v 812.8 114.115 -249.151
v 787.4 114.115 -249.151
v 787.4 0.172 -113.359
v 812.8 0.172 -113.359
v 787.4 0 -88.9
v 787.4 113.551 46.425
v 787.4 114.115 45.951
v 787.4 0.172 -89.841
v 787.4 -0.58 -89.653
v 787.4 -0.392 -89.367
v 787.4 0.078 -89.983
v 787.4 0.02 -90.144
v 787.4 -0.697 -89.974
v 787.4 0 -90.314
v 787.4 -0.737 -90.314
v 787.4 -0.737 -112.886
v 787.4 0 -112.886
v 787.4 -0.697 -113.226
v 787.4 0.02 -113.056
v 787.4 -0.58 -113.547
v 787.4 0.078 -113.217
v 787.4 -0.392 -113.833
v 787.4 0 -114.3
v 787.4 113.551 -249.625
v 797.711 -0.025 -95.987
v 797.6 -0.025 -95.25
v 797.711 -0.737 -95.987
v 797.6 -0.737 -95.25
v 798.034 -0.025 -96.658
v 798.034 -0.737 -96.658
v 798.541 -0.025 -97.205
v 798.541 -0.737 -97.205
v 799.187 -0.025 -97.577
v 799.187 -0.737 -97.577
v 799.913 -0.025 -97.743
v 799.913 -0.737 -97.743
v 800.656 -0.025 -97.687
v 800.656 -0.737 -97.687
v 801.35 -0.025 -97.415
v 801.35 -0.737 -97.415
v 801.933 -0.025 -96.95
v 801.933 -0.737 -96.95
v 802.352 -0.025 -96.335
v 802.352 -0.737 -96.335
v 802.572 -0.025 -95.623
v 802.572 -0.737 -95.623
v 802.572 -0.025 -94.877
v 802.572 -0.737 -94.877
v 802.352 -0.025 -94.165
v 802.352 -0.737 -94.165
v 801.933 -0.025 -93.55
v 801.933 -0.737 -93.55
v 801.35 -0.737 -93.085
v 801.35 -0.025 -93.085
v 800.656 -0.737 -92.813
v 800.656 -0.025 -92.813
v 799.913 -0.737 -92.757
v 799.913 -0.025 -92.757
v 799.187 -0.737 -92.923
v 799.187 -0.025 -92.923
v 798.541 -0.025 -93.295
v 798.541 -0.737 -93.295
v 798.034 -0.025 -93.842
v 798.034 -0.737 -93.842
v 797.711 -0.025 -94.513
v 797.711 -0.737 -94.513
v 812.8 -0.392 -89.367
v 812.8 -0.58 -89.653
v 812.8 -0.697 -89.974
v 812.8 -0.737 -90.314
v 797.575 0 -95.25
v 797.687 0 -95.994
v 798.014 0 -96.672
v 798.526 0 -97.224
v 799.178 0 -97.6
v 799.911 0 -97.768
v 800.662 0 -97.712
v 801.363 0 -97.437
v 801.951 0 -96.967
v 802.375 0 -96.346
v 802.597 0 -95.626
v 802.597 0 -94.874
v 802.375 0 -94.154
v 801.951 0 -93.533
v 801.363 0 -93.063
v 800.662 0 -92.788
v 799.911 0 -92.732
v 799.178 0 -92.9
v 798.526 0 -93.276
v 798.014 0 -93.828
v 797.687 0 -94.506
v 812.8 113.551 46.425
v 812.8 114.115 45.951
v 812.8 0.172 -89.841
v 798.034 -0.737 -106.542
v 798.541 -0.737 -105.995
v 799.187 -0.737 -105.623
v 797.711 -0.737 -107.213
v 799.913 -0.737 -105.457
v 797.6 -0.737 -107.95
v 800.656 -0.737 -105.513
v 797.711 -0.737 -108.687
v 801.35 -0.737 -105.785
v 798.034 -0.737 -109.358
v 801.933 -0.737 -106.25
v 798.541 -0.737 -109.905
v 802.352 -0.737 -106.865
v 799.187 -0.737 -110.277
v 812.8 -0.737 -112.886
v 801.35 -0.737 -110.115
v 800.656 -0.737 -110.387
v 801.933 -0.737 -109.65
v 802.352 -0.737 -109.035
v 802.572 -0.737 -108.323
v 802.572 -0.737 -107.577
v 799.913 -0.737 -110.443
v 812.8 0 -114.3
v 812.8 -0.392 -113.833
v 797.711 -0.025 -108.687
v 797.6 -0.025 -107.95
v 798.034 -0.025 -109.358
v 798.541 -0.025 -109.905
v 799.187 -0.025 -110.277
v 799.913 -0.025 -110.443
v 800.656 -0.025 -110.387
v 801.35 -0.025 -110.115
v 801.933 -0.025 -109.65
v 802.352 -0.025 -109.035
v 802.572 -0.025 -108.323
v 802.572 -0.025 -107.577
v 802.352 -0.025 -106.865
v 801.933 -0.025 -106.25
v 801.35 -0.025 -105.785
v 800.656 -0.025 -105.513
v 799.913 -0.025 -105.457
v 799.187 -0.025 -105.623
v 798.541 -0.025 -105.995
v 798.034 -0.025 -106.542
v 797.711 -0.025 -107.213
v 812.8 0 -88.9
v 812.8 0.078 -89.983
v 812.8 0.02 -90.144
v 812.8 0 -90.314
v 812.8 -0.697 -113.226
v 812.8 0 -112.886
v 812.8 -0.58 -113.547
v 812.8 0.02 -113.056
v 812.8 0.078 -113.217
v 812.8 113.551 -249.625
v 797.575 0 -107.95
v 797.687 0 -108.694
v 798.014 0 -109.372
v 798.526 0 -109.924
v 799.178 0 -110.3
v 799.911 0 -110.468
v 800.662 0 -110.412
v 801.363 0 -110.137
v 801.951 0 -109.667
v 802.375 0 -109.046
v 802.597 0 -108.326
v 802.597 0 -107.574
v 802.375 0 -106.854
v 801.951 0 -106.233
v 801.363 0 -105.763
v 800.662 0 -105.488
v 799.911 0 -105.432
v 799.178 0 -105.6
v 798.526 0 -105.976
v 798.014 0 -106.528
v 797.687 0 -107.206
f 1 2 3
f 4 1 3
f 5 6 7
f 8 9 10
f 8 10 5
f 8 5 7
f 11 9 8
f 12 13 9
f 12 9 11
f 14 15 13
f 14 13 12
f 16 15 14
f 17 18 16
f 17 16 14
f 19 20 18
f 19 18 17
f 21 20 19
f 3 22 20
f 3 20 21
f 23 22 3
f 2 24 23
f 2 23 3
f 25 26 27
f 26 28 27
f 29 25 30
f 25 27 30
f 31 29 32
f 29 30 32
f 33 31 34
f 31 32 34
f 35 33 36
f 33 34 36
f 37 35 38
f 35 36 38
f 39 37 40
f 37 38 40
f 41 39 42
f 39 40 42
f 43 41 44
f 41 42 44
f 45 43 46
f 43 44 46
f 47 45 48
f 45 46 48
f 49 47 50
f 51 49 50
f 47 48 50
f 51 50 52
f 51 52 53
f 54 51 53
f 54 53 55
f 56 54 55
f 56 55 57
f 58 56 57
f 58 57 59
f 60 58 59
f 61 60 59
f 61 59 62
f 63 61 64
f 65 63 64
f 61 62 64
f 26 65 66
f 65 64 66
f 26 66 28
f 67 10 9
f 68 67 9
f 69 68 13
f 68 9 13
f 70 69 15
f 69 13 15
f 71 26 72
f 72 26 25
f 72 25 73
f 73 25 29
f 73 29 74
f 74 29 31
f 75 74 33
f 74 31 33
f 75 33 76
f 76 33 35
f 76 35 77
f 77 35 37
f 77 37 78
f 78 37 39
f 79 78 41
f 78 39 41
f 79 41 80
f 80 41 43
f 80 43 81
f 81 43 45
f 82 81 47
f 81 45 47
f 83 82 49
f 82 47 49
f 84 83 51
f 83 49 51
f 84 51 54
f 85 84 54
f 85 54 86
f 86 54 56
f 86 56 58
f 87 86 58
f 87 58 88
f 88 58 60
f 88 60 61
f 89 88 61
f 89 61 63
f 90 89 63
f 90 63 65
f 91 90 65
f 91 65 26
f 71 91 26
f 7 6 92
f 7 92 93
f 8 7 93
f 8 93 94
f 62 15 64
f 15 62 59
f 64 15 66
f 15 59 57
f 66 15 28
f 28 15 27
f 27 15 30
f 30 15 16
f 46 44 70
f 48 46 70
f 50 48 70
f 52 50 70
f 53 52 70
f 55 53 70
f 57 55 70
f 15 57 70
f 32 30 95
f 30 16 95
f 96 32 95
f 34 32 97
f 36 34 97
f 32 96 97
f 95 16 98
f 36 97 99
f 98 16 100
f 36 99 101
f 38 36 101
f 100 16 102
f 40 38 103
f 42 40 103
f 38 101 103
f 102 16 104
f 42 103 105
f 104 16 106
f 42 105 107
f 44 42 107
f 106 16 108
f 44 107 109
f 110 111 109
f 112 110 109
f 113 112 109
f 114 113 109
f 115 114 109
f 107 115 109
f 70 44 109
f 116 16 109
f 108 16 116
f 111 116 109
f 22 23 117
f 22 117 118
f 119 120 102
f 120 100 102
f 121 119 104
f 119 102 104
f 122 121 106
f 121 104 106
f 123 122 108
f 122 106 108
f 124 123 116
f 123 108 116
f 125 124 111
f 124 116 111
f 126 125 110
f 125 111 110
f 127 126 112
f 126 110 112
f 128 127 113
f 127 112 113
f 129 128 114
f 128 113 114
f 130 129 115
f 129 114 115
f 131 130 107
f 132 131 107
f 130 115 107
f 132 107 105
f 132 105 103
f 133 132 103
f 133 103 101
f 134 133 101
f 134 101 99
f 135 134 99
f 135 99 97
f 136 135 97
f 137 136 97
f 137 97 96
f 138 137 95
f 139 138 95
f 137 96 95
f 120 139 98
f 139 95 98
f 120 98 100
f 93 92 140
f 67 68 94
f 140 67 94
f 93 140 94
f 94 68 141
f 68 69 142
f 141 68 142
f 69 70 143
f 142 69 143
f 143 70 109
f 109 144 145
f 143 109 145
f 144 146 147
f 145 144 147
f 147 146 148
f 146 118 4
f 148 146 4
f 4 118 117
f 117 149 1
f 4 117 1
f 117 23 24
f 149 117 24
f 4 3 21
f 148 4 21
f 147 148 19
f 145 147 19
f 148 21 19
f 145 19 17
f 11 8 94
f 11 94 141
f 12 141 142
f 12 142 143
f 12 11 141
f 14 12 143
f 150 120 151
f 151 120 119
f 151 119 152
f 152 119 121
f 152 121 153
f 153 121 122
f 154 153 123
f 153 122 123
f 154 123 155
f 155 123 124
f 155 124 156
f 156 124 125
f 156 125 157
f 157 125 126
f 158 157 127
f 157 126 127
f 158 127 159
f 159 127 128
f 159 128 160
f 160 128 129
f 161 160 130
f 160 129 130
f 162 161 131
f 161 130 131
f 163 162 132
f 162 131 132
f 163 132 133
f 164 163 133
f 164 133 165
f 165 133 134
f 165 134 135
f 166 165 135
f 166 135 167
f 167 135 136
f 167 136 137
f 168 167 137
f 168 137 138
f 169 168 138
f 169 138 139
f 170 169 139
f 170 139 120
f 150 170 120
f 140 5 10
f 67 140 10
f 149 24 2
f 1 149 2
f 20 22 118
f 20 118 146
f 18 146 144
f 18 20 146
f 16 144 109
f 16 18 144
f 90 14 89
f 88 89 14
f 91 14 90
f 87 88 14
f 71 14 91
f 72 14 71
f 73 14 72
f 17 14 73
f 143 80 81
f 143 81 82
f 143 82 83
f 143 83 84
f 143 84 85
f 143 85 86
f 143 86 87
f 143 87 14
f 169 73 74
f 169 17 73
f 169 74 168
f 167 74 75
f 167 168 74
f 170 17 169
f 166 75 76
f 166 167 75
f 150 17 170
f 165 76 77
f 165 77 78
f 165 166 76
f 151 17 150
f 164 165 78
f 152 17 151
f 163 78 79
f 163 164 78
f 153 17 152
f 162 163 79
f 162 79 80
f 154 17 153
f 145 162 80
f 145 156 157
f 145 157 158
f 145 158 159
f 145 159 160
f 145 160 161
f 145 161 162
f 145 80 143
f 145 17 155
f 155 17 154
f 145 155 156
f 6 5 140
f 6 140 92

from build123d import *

# Parameters (mm, degrees)
SKETCH5_W                       = 25.4
SKETCH5_H                       = 25.4
BASE_FLANGE1_DEPTH              = 0.7366
EDGE_FLANGE1_START              = 787.4
EDGE_FLANGE1_DEPTH              = 25.4
EDGE_FLANGE1_2_DEPTH            = 25.4
F_5_0MM_DOWEL_HOLE1_D           = 5
F_5_0MM_DOWEL_HOLE1_DEPTH       = 25.4
F_5_0MM_DOWEL_HOLE1_CSINK_D     = 5.05
F_5_0MM_DOWEL_HOLE1_CSINK_ANGLE = 90
F_5_0MM_DOWEL_HOLE1_TIP         = 1.502151548


# Read off the part's stored shape, not the designer's step: Edge-Flange1
# Sheet-metal steps are written as plain solids
with BuildPart() as part:
    # Sketch5 → Base-Flange1 (new body)
    with BuildSketch(Plane(origin=(0, 0, 0), x_dir=(1, 0, 0), z_dir=(0, 1, 0))):
        with Locations((800.1, 101.6)):
            Rectangle(SKETCH5_W, SKETCH5_H)
    extrude(amount=-BASE_FLANGE1_DEPTH)

    # Edge-Flange1 outline → Edge-Flange1 (cut)
    with BuildSketch(Plane.YZ.offset(EDGE_FLANGE1_START)):
        with BuildLine():
            Line((0, -114.3), (-0.391936674, -113.832908061))
            ThreePointArc((-0.391936674, -113.832908061), (-0.647755169, -113.38981743), (-0.7366, -112.885953355))
            Line((-0.7366, -112.885953355), (-0.7366, -114.3))
            Line((-0.7366, -114.3), (0, -114.3))
        make_face()
    edge_flange1 = extrude(amount=EDGE_FLANGE1_DEPTH, mode=Mode.SUBTRACT)

    # Edge-Flange1 2 outline → Edge-Flange1 2 (add)
    with BuildSketch(Plane.YZ.offset(EDGE_FLANGE1_START)):
        with BuildLine():
            Line((0, -112.885953355), (0, -114.3))
            Line((0, -114.3), (113.551037002, -249.62485629))
            Line((113.551037002, -249.62485629), (114.115305339, -249.151378937))
            Line((114.115305339, -249.151378937), (0.172331663, -113.359430708))
            ThreePointArc((0.172331663, -113.359430708), (0.044422416, -113.137885392), (0, -112.885953355))
        make_face()
    edge_flange1_2 = extrude(amount=EDGE_FLANGE1_2_DEPTH)

    # Mirror1: Edge-Flange1, Edge-Flange1 2 across plane
    add(edge_flange1.mirror(Plane.XY.offset(-101.6)), mode=Mode.SUBTRACT)
    add(edge_flange1_2.mirror(Plane.XY.offset(-101.6)))

    # Ø5.0mm Dowel Hole1
    with Locations(Plane(origin=(0, 0, 0), x_dir=(1, 0, 0), z_dir=(0, 1, 0))):
        with Locations((800.1, 107.95), (800.1, 95.25)):
            CounterSinkHole(F_5_0MM_DOWEL_HOLE1_D / 2, F_5_0MM_DOWEL_HOLE1_CSINK_D / 2, depth=F_5_0MM_DOWEL_HOLE1_DEPTH, counter_sink_angle=F_5_0MM_DOWEL_HOLE1_CSINK_ANGLE)
            with Locations((0, 0, -(F_5_0MM_DOWEL_HOLE1_DEPTH + F_5_0MM_DOWEL_HOLE1_TIP / 2))):  # 118° drill point
                Cone(0, F_5_0MM_DOWEL_HOLE1_D / 2, F_5_0MM_DOWEL_HOLE1_TIP, mode=Mode.SUBTRACT)


solid = part.part
